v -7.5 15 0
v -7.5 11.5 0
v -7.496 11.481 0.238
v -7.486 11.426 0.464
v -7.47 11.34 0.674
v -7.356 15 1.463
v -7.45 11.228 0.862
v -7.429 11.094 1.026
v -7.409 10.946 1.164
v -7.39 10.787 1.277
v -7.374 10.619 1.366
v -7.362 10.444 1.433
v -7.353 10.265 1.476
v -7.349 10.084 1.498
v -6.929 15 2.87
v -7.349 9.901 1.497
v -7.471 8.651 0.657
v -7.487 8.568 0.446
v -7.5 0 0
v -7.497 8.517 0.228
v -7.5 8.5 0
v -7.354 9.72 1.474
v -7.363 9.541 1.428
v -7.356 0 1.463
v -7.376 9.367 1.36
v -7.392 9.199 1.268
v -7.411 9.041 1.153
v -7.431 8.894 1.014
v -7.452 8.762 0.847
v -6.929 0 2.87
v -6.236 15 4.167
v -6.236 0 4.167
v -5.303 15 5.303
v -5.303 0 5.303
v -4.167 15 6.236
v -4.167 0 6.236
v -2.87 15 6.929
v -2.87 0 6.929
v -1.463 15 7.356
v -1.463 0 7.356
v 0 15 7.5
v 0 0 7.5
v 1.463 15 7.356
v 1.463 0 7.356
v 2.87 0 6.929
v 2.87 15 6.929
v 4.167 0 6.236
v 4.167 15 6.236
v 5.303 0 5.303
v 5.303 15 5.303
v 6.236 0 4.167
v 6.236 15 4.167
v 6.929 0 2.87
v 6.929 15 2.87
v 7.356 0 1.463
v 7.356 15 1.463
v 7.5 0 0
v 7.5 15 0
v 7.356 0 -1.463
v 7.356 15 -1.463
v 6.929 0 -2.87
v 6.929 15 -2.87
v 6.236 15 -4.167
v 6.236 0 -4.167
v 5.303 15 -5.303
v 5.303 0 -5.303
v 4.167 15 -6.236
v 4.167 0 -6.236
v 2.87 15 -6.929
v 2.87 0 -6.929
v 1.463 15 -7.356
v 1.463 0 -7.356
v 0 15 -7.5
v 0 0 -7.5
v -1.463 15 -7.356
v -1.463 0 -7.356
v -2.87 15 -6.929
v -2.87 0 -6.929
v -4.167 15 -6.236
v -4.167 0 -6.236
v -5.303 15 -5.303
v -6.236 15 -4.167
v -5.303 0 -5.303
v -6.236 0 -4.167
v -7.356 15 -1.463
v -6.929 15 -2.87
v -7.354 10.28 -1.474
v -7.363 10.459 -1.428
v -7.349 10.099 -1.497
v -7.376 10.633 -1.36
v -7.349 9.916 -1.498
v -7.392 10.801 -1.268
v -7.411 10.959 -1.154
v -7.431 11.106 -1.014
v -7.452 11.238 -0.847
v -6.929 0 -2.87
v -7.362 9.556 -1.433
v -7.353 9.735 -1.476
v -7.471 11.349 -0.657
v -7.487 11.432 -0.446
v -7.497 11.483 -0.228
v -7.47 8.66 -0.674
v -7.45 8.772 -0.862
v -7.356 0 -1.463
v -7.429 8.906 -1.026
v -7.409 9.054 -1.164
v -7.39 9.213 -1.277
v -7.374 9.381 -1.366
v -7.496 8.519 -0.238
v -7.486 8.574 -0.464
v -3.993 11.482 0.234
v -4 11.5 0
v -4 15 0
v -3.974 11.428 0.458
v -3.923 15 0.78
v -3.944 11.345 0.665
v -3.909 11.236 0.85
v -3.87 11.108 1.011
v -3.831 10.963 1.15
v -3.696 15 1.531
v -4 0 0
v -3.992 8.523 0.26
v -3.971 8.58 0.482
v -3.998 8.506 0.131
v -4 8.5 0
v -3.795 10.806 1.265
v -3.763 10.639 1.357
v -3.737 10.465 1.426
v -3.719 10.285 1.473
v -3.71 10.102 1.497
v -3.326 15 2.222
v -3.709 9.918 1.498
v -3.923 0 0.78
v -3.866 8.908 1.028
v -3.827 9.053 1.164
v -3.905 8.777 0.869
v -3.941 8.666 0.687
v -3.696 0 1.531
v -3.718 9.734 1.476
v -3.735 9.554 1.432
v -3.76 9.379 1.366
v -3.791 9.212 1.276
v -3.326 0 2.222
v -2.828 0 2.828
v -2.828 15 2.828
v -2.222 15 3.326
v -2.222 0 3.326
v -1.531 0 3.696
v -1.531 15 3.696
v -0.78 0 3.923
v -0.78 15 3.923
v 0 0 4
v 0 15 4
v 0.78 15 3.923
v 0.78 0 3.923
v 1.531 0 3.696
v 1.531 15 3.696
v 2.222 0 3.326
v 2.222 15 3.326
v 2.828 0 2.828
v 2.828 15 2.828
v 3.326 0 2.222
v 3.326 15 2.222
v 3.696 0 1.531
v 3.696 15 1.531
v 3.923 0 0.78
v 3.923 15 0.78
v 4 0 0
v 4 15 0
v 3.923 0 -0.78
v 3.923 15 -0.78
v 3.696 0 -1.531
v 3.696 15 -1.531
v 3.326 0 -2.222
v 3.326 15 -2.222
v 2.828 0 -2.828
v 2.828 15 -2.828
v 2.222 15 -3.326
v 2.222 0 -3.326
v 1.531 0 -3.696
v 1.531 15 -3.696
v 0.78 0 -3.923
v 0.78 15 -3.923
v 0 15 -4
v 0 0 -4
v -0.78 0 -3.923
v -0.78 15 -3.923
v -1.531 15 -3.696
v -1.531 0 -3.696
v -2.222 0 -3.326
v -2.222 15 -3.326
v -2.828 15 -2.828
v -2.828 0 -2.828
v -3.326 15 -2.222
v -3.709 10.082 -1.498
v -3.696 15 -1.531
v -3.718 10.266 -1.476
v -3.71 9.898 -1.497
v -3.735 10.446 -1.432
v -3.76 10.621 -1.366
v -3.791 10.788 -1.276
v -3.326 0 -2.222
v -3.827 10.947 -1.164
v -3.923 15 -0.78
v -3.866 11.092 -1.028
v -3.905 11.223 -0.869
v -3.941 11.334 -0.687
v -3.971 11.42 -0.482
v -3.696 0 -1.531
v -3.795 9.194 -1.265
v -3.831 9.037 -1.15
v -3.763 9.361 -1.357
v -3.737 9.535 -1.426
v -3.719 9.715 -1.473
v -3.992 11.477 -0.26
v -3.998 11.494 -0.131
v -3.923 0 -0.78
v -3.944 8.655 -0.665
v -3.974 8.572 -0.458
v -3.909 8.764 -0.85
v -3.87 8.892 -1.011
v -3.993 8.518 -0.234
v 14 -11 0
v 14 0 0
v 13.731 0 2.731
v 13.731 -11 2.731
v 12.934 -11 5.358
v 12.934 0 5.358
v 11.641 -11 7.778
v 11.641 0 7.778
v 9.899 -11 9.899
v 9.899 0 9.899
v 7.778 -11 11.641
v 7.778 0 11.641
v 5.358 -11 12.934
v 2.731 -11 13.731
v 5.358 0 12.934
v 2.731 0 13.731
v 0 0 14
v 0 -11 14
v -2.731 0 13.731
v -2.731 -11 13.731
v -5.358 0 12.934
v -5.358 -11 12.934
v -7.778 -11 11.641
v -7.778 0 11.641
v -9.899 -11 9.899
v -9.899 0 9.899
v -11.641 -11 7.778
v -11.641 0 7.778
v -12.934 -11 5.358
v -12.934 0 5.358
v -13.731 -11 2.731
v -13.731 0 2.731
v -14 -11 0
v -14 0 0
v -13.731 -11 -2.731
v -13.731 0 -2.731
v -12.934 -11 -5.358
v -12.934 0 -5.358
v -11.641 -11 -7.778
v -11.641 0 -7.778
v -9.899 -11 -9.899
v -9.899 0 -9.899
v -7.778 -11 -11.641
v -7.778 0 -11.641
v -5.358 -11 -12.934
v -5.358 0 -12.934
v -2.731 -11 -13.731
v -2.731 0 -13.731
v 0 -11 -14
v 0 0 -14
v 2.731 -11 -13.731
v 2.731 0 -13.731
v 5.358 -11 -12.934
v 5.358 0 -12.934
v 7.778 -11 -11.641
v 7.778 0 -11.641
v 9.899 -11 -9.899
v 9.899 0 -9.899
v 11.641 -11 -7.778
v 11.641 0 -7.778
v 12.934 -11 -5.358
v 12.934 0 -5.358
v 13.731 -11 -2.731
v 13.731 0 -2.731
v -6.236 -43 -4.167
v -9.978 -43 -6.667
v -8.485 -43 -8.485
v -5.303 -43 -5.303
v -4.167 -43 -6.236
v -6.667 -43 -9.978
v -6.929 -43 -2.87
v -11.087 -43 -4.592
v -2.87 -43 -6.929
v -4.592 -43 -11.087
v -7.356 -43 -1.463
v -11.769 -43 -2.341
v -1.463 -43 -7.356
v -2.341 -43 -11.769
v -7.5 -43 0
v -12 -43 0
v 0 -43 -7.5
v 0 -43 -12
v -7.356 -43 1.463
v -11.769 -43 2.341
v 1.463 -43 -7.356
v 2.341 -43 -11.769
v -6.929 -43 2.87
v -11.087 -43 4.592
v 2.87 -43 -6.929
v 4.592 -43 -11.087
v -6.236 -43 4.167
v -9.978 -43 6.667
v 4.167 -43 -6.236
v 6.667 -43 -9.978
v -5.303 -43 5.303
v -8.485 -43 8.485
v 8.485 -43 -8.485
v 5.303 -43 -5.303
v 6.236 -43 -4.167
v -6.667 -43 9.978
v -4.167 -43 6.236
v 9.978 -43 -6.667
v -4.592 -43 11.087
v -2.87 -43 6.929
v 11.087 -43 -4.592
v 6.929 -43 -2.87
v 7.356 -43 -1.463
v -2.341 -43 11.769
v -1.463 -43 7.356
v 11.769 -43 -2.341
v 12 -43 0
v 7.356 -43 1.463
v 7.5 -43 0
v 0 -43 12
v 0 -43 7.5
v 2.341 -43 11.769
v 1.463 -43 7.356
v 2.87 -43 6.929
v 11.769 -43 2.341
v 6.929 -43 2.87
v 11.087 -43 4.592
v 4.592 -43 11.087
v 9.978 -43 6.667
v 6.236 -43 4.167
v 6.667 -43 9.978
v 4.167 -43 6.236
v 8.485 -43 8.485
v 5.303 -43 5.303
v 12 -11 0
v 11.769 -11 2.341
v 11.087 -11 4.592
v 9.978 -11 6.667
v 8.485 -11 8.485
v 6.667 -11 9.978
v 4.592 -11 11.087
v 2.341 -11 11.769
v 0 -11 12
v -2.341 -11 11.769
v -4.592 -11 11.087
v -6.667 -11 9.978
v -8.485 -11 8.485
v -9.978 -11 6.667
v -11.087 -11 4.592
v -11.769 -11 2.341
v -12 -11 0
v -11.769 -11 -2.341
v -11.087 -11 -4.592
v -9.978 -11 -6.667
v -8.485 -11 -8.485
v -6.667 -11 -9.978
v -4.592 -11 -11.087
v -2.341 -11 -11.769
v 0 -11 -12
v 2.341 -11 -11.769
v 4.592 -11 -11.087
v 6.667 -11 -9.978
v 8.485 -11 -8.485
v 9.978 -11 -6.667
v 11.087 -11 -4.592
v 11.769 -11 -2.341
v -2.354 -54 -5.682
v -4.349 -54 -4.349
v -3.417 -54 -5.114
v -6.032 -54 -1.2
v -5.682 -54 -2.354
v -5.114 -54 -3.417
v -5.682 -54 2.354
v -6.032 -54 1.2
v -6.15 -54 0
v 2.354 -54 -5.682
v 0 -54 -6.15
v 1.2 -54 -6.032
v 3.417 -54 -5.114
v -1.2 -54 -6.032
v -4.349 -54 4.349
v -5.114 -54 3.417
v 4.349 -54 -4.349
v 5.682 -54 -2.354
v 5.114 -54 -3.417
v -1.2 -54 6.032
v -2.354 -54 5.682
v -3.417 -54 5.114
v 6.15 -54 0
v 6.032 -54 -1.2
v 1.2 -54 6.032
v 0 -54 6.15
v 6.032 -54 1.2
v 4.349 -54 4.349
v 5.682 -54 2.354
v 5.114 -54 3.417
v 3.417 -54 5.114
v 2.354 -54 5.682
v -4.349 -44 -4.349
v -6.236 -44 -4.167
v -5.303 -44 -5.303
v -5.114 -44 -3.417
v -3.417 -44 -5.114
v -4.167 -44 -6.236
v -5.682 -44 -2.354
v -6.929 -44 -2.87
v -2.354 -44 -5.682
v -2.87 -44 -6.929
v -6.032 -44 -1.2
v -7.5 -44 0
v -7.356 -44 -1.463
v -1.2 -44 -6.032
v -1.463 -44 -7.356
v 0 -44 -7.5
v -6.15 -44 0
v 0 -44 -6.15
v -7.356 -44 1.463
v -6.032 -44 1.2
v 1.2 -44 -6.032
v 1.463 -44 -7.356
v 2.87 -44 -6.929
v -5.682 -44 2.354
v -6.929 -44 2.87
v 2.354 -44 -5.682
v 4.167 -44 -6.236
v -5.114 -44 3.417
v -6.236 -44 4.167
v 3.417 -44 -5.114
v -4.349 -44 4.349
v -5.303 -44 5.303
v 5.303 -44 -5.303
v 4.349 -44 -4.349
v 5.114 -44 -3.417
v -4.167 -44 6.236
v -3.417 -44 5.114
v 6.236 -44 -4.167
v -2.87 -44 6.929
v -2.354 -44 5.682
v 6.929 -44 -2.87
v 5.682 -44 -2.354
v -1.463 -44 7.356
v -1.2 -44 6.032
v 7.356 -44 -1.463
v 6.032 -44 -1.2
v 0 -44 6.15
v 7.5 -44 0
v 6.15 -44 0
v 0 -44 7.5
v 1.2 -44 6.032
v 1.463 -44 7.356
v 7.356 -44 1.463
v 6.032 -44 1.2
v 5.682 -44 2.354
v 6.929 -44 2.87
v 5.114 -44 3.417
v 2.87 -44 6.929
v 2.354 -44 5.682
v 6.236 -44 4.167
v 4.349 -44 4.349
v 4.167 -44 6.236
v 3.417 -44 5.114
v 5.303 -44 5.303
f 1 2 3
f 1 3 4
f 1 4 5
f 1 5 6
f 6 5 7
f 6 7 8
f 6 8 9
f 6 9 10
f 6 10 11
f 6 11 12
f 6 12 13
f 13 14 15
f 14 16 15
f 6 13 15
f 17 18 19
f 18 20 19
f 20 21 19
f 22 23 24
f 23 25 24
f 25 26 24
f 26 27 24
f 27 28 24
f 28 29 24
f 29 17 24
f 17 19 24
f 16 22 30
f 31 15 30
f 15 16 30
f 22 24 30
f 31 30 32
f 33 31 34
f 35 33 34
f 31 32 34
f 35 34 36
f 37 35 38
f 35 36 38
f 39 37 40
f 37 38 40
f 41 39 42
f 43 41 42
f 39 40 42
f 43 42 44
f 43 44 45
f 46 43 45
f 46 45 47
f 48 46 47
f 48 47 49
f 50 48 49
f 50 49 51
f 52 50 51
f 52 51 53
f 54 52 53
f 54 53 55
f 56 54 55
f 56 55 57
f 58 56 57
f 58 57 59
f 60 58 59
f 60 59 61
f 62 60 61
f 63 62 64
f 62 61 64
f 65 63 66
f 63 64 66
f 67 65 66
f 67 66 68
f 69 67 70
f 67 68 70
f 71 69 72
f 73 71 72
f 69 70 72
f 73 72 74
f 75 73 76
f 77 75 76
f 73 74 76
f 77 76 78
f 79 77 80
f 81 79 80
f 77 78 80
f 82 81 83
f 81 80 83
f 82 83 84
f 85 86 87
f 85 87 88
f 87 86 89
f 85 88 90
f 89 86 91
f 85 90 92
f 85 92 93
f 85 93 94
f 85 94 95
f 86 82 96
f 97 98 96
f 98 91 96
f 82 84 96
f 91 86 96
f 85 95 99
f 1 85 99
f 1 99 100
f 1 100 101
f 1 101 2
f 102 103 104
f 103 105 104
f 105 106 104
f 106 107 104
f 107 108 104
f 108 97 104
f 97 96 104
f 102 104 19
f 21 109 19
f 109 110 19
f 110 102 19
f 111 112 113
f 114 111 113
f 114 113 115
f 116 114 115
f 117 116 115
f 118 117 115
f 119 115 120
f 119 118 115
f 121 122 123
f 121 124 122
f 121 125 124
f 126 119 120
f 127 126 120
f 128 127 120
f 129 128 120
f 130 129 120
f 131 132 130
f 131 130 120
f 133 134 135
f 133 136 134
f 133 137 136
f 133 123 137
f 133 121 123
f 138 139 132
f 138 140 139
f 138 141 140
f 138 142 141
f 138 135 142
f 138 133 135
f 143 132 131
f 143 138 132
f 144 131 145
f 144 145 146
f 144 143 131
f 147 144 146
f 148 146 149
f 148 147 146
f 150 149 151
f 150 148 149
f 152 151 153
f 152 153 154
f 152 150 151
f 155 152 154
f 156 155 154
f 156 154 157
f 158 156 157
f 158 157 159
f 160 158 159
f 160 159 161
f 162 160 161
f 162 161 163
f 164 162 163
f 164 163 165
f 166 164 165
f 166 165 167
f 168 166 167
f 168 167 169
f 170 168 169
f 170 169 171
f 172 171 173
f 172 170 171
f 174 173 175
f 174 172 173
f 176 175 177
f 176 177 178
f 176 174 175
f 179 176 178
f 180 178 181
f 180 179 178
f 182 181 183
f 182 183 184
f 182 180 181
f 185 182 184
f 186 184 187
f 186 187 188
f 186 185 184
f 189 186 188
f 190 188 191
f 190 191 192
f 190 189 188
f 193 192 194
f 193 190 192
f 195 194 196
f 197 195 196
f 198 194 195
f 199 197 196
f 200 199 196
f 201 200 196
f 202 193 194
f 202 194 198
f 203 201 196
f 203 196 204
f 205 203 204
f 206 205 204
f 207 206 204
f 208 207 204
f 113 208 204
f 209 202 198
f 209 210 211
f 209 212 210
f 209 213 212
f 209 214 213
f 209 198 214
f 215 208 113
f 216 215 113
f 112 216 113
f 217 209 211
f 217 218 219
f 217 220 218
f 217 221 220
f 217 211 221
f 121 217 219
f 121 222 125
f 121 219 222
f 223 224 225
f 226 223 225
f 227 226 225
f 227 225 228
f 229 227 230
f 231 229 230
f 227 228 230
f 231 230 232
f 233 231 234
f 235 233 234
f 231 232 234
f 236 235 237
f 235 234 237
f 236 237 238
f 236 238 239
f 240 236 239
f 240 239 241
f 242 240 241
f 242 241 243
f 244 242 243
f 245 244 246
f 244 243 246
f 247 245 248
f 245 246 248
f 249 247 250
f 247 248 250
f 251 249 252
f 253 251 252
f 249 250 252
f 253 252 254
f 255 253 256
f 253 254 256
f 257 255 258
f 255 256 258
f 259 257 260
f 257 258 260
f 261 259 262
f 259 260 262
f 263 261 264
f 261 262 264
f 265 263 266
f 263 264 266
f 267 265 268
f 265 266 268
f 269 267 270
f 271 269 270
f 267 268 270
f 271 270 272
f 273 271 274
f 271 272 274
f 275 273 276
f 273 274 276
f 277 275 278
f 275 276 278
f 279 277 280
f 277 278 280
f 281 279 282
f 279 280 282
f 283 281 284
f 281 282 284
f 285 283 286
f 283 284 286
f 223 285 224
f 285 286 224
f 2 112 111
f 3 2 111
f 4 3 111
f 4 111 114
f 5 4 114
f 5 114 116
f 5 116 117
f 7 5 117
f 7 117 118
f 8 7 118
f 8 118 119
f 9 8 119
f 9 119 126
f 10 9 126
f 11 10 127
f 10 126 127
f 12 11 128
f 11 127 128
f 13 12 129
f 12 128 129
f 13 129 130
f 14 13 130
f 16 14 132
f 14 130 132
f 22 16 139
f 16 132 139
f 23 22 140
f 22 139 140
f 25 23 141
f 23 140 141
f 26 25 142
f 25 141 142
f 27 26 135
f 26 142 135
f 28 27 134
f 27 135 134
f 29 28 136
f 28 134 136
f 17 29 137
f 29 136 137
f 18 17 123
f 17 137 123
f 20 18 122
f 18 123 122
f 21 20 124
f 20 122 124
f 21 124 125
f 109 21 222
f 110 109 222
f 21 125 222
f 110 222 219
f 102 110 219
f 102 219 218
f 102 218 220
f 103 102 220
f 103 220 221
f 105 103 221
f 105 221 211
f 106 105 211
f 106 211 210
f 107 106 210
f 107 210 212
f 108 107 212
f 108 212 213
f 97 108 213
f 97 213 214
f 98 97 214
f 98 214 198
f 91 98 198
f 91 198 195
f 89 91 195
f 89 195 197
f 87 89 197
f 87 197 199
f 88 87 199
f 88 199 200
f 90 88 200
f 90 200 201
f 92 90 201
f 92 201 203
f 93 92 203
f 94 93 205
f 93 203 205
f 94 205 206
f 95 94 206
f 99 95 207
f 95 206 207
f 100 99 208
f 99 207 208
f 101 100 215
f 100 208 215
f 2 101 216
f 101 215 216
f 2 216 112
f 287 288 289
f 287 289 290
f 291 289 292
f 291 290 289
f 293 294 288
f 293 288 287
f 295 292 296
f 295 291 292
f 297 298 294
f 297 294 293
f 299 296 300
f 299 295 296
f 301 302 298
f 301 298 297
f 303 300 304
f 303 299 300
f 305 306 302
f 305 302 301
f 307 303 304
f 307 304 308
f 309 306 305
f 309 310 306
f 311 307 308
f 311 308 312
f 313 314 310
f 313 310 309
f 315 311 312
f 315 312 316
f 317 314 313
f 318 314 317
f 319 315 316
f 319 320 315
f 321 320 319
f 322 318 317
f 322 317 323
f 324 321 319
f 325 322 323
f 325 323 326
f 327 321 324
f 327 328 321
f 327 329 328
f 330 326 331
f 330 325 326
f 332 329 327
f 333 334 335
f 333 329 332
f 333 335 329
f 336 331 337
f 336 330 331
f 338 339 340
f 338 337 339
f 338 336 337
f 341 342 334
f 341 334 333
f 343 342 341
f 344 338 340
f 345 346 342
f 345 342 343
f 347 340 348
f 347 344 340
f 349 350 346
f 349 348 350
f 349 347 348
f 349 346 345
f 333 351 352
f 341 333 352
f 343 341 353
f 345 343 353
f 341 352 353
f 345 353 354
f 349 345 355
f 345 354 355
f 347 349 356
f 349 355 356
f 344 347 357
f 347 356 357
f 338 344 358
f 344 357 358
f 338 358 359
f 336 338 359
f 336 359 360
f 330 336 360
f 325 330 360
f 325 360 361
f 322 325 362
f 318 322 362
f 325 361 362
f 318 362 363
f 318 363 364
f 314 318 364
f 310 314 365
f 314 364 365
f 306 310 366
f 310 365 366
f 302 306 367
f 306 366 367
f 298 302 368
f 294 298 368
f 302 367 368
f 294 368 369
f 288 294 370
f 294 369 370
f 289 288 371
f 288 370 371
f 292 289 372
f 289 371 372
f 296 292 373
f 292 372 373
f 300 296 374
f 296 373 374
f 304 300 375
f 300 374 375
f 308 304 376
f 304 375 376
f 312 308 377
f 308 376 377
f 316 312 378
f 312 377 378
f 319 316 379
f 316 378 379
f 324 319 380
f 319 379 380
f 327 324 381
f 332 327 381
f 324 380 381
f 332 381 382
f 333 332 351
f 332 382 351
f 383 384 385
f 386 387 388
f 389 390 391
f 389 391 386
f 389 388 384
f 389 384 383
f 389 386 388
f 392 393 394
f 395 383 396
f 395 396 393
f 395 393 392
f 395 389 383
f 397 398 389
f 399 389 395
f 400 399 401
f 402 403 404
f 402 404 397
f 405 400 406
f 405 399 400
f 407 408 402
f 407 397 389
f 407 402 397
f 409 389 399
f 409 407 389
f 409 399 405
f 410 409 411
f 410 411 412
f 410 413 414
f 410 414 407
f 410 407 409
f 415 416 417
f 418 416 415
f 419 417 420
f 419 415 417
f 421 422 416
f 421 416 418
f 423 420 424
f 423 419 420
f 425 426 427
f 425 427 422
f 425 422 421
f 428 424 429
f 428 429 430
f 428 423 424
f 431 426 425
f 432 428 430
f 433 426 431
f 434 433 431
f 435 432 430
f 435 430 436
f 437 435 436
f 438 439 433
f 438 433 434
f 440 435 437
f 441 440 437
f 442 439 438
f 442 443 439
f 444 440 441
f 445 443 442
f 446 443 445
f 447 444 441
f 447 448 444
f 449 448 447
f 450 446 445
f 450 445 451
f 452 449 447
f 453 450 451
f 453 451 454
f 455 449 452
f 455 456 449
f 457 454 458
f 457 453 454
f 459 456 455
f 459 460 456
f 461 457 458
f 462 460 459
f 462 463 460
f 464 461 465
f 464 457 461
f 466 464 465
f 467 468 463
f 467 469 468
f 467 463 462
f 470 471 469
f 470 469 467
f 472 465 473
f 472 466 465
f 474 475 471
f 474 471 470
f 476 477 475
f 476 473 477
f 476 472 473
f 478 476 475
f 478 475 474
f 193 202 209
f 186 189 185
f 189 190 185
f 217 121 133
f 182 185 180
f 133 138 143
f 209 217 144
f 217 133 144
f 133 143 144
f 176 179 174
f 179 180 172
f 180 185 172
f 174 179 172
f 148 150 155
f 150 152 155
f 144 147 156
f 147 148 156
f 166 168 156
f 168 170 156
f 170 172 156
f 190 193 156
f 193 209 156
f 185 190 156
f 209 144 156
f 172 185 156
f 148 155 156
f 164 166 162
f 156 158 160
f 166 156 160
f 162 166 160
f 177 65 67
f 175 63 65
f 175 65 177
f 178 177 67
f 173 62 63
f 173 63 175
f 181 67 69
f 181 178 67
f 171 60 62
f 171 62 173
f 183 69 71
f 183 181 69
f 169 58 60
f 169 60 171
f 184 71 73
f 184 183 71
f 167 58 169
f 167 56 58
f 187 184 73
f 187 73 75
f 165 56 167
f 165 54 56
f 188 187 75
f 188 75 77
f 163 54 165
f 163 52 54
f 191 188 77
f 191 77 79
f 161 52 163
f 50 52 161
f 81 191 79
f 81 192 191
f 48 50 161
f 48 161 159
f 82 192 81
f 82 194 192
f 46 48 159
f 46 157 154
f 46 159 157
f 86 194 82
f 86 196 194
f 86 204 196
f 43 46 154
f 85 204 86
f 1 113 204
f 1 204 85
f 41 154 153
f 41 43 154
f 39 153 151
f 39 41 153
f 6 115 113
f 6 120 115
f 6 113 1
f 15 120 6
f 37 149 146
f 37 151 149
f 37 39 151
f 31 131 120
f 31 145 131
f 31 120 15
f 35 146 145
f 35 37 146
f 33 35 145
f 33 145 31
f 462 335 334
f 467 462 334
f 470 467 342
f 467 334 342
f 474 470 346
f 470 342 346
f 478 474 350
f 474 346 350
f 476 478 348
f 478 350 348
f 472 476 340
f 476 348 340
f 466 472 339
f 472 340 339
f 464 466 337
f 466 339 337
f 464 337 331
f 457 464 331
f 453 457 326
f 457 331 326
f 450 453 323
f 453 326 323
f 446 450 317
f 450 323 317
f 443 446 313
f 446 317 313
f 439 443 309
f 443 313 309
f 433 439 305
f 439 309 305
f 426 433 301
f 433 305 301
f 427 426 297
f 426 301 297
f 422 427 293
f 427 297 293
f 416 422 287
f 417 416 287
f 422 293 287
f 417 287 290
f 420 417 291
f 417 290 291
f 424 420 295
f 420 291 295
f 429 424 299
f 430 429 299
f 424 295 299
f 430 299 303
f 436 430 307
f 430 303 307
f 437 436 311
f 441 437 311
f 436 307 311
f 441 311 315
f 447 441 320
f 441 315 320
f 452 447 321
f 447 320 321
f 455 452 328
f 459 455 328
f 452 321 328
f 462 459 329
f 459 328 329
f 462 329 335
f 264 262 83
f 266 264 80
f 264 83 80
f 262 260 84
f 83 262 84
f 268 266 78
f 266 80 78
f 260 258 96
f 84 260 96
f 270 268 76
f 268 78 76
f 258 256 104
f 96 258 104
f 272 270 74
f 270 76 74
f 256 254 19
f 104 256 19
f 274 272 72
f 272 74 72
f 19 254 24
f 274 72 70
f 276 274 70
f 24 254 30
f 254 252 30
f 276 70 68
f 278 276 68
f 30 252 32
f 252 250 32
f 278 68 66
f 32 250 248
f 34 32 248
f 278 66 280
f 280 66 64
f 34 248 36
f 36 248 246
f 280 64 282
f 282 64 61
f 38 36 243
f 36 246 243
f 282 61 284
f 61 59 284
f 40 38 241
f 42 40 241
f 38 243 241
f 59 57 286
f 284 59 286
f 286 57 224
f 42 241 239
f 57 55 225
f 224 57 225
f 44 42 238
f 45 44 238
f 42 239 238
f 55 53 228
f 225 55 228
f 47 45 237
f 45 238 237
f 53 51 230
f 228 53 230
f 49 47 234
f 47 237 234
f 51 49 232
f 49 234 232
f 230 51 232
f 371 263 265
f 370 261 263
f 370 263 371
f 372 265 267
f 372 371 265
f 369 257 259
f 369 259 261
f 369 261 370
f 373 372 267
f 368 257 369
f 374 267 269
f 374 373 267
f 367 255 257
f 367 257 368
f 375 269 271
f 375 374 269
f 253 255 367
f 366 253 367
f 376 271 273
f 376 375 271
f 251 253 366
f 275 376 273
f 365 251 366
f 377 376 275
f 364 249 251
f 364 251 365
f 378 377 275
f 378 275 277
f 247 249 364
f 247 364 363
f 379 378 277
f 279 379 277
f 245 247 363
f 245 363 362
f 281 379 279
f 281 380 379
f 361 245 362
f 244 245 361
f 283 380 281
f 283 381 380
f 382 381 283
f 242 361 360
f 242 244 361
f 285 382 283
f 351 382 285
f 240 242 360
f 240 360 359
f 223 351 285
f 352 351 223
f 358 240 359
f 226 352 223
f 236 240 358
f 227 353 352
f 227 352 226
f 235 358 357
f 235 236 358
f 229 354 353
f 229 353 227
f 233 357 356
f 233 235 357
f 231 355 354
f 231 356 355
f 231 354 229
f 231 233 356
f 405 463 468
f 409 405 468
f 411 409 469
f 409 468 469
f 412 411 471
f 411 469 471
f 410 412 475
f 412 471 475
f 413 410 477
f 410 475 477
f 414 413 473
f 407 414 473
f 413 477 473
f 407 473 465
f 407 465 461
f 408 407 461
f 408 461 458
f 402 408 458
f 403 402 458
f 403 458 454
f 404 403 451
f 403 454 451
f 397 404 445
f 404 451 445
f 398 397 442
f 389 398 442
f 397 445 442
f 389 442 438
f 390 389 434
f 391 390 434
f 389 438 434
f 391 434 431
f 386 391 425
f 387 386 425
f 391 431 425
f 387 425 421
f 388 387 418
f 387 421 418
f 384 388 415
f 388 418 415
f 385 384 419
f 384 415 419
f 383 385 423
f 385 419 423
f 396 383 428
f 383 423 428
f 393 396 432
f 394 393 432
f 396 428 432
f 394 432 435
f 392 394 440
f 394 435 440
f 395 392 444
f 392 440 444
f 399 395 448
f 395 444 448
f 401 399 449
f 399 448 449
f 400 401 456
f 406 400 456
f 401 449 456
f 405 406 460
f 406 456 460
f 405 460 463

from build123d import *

# Parameters (mm, degrees)
F0_R      = 14
F1_DEPTH  = 11
F2_R      = 12
F3_DEPTH  = 32
F4_R      = 7.5
F4_R_2    = 4
F5_DEPTH  = 15
F6_R      = 7.5
F7_DEPTH  = 1
F8_R      = 6.15
F9_DEPTH  = 10
F10_R     = 1.5
F11_DEPTH = 25


with BuildPart() as f1:
    # F0 (on Front) → F1 (new body)
    with BuildSketch(Plane.XZ):
        Circle(F0_R)
    extrude(amount=F1_DEPTH)

    # F2 (on face) → F3 (join)
    with BuildSketch(Plane.XZ.offset(11)):
        Circle(F2_R)
    extrude(amount=F3_DEPTH)

    # F4 (on face) → F5 (join)
    with BuildSketch(Plane(origin=(0, 0, 0), x_dir=(-1, 0, 0), z_dir=(0, 1, 0))):
        Circle(F4_R)
        Circle(F4_R_2, mode=Mode.SUBTRACT)
    extrude(amount=F5_DEPTH)

    # F6 (on face) → F7 (join)
    with BuildSketch(Plane.XZ.offset(43)):
        Circle(F6_R)
    extrude(amount=F7_DEPTH)

    # F8 (on face) → F9 (join)
    with BuildSketch(Plane.XZ.offset(44)):
        Circle(F8_R)
    extrude(amount=F9_DEPTH)

    # F10 (on Right) → F11 (cut)
    with BuildSketch(Plane.YZ):
        with Locations((10, 0)):
            Circle(F10_R)
    extrude(amount=-F11_DEPTH, mode=Mode.SUBTRACT)


solid = f1.part
